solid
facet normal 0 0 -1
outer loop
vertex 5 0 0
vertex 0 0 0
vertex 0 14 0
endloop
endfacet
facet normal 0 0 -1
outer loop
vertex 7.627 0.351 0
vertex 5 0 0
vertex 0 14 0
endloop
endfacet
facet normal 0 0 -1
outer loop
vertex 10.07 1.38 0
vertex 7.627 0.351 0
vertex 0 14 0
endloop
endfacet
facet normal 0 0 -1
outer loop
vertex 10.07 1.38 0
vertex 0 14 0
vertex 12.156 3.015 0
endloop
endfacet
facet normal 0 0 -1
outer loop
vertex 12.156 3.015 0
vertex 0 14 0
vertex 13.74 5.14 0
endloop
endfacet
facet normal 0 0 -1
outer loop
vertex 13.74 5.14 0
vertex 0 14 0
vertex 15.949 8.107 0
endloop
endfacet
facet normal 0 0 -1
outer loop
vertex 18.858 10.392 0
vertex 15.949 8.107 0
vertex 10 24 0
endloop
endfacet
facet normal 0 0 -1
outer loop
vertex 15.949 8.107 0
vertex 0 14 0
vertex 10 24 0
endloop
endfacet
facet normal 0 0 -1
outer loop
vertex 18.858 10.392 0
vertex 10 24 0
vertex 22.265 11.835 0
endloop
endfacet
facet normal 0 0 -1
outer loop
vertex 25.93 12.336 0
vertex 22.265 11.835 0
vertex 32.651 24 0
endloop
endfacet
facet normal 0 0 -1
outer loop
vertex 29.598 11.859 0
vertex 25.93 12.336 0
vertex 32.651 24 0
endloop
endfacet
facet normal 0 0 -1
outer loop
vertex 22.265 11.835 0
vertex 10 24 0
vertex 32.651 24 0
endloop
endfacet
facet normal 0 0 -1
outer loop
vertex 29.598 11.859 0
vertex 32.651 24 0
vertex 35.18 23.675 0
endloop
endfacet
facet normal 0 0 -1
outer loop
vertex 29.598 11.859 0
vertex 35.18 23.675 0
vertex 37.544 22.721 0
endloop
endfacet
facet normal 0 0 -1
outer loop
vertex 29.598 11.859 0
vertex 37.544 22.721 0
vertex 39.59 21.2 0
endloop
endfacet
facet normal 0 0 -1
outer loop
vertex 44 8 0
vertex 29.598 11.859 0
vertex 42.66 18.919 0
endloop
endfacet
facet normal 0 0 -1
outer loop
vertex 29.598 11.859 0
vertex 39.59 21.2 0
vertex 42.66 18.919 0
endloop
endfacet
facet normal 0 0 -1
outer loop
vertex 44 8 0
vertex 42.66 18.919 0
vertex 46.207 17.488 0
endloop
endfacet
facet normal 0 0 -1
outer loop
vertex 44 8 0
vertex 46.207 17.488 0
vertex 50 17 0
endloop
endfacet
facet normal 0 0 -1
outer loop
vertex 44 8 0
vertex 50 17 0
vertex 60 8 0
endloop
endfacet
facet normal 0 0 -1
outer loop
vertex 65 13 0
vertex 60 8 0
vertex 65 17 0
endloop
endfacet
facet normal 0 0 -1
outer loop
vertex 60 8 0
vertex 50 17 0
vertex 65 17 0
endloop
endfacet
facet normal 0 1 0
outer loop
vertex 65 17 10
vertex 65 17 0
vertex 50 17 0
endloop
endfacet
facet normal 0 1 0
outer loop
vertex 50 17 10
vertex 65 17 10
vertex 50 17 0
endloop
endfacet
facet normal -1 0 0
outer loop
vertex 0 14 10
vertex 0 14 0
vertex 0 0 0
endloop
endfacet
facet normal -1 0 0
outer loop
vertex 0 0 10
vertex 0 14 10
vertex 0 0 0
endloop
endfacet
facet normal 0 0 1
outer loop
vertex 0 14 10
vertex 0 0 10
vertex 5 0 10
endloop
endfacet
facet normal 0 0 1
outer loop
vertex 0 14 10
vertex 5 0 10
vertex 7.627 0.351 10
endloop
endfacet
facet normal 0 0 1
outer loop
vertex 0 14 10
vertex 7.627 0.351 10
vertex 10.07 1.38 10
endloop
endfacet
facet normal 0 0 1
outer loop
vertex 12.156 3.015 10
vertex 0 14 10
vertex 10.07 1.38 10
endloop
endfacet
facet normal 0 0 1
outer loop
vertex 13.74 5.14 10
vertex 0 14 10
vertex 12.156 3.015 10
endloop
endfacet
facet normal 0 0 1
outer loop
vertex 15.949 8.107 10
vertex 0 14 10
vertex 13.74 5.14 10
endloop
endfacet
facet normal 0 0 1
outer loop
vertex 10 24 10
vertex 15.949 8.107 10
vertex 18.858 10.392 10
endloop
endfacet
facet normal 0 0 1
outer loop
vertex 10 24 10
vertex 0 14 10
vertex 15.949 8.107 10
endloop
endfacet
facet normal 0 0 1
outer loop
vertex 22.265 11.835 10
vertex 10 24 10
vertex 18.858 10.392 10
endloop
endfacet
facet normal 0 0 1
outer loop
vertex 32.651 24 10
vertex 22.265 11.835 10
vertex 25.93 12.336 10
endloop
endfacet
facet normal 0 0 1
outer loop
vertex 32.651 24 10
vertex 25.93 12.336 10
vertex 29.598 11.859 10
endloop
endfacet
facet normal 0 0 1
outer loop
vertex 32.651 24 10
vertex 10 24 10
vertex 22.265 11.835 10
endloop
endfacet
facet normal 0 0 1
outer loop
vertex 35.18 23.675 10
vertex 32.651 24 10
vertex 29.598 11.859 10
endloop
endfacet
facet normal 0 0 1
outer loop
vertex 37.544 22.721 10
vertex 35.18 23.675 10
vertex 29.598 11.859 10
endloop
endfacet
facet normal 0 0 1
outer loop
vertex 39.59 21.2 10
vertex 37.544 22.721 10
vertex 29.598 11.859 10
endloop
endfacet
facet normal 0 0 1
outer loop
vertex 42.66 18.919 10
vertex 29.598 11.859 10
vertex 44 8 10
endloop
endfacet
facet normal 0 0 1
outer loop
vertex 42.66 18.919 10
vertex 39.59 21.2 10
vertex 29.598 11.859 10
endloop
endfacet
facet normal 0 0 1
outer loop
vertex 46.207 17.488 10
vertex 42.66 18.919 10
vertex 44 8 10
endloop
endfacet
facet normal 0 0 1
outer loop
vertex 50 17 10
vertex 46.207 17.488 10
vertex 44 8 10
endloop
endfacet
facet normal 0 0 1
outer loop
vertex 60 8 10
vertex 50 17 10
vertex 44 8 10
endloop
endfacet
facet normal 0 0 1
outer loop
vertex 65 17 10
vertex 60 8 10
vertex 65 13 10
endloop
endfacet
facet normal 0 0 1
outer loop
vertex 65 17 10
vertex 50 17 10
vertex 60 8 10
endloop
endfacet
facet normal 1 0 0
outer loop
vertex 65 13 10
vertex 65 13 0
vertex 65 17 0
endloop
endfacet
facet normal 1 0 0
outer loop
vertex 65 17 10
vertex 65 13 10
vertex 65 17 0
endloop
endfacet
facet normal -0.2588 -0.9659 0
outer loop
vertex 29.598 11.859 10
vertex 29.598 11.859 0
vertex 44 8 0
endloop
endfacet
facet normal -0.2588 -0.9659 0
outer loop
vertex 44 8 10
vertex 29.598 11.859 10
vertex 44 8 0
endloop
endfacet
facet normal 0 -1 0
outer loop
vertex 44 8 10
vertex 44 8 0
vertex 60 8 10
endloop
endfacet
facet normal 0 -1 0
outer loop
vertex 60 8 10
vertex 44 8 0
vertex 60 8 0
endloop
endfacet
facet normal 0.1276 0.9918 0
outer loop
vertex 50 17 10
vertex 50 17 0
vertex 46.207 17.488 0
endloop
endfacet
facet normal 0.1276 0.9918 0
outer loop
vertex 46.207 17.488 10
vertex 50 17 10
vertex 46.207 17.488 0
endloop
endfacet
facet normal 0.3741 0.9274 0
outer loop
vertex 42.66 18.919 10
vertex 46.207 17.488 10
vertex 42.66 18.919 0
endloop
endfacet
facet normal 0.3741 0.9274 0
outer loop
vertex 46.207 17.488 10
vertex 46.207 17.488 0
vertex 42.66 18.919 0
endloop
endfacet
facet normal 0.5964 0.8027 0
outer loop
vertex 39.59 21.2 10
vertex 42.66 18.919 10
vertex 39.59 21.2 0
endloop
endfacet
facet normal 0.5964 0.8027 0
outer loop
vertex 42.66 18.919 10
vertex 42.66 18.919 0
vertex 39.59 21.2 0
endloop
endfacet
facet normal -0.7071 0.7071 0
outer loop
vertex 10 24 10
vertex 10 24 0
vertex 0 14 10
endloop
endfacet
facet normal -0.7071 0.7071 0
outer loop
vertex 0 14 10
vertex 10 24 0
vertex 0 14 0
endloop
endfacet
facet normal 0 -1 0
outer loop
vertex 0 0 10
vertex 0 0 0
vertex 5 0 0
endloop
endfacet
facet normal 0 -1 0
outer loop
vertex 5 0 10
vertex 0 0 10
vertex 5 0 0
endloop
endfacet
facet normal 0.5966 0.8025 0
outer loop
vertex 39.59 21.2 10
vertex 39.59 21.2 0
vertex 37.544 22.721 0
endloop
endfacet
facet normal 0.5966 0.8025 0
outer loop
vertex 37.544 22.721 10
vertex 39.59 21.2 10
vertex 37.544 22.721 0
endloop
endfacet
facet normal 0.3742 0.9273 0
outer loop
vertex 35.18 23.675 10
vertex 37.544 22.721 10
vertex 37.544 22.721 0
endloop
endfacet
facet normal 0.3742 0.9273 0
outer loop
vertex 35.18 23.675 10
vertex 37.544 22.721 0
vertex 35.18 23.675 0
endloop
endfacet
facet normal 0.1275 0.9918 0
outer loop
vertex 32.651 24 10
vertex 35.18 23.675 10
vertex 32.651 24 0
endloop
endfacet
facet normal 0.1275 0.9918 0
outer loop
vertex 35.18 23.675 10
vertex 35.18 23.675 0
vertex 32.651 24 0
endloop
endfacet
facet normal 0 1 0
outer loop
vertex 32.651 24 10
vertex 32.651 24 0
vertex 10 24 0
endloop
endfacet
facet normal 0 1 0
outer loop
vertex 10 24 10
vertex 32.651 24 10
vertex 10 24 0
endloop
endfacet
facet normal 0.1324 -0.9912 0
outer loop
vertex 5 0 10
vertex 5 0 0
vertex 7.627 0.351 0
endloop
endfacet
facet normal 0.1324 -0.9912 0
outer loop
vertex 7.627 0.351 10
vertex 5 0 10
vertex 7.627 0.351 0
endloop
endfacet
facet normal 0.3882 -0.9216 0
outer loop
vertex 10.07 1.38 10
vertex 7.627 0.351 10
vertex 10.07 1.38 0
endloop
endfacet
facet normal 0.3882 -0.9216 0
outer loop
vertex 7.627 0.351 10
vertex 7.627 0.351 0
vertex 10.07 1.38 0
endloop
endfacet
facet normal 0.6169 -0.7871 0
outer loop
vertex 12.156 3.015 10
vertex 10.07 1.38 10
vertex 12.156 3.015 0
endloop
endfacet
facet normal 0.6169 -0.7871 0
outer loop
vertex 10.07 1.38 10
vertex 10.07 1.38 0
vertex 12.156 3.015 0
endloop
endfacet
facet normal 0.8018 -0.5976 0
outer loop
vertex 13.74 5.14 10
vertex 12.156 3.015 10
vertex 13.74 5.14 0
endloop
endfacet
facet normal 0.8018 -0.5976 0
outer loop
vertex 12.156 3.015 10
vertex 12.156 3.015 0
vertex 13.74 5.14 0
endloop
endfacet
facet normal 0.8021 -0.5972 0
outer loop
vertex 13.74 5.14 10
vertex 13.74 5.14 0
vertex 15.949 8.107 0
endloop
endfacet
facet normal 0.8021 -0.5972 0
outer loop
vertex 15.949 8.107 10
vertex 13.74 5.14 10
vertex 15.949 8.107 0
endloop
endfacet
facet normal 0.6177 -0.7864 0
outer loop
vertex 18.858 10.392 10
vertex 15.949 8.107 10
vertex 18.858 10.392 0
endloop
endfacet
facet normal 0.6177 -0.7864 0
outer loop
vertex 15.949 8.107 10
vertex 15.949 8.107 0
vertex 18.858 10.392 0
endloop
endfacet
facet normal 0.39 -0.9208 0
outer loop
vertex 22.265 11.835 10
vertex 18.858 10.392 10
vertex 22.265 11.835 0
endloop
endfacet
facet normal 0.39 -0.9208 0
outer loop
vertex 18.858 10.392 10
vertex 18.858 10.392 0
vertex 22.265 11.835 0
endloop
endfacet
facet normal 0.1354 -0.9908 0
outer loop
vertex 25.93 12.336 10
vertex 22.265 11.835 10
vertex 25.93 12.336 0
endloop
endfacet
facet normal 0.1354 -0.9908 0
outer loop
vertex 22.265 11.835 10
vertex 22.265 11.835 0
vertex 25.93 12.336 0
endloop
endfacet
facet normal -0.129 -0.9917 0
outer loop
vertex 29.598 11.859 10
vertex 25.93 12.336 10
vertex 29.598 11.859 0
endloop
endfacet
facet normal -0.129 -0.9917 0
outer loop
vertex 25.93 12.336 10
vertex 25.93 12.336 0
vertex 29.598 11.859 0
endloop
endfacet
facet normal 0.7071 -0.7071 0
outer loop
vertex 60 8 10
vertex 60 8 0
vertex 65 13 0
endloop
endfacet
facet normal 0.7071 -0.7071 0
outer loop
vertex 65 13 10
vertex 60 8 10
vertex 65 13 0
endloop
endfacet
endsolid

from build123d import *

# Parameters (mm, degrees)
F1_DEPTH = 10


with BuildPart() as f1:
    # F0 (on Top) → F1 (new body)
    with BuildSketch(Plane.XY):
        with BuildLine():
            Line((0, 14), (0, 0))
            Line((0, 0), (5, 0))
            ThreePointArc((5, 0), (10.069501, 1.380246), (13.739571, 5.139969))
            ThreePointArc((13.739571, 5.139969), (20.513532, 11.226724), (29.598437, 11.858887))
            Line((29.598437, 11.858887), (44, 8))
            Line((44, 8), (60, 8))
            Line((60, 8), (65, 13))
            Line((65, 13), (65, 17))
            Line((65, 17), (50, 17))
            ThreePointArc((50, 17), (44.387514, 18.089572), (39.590389, 21.2))
            ThreePointArc((39.590389, 21.2), (36.392306, 23.273618), (32.650648, 24))
            Line((32.650648, 24), (10, 24))
            Line((10, 24), (0, 14))
        make_face()
    extrude(amount=F1_DEPTH)


solid = f1.part
